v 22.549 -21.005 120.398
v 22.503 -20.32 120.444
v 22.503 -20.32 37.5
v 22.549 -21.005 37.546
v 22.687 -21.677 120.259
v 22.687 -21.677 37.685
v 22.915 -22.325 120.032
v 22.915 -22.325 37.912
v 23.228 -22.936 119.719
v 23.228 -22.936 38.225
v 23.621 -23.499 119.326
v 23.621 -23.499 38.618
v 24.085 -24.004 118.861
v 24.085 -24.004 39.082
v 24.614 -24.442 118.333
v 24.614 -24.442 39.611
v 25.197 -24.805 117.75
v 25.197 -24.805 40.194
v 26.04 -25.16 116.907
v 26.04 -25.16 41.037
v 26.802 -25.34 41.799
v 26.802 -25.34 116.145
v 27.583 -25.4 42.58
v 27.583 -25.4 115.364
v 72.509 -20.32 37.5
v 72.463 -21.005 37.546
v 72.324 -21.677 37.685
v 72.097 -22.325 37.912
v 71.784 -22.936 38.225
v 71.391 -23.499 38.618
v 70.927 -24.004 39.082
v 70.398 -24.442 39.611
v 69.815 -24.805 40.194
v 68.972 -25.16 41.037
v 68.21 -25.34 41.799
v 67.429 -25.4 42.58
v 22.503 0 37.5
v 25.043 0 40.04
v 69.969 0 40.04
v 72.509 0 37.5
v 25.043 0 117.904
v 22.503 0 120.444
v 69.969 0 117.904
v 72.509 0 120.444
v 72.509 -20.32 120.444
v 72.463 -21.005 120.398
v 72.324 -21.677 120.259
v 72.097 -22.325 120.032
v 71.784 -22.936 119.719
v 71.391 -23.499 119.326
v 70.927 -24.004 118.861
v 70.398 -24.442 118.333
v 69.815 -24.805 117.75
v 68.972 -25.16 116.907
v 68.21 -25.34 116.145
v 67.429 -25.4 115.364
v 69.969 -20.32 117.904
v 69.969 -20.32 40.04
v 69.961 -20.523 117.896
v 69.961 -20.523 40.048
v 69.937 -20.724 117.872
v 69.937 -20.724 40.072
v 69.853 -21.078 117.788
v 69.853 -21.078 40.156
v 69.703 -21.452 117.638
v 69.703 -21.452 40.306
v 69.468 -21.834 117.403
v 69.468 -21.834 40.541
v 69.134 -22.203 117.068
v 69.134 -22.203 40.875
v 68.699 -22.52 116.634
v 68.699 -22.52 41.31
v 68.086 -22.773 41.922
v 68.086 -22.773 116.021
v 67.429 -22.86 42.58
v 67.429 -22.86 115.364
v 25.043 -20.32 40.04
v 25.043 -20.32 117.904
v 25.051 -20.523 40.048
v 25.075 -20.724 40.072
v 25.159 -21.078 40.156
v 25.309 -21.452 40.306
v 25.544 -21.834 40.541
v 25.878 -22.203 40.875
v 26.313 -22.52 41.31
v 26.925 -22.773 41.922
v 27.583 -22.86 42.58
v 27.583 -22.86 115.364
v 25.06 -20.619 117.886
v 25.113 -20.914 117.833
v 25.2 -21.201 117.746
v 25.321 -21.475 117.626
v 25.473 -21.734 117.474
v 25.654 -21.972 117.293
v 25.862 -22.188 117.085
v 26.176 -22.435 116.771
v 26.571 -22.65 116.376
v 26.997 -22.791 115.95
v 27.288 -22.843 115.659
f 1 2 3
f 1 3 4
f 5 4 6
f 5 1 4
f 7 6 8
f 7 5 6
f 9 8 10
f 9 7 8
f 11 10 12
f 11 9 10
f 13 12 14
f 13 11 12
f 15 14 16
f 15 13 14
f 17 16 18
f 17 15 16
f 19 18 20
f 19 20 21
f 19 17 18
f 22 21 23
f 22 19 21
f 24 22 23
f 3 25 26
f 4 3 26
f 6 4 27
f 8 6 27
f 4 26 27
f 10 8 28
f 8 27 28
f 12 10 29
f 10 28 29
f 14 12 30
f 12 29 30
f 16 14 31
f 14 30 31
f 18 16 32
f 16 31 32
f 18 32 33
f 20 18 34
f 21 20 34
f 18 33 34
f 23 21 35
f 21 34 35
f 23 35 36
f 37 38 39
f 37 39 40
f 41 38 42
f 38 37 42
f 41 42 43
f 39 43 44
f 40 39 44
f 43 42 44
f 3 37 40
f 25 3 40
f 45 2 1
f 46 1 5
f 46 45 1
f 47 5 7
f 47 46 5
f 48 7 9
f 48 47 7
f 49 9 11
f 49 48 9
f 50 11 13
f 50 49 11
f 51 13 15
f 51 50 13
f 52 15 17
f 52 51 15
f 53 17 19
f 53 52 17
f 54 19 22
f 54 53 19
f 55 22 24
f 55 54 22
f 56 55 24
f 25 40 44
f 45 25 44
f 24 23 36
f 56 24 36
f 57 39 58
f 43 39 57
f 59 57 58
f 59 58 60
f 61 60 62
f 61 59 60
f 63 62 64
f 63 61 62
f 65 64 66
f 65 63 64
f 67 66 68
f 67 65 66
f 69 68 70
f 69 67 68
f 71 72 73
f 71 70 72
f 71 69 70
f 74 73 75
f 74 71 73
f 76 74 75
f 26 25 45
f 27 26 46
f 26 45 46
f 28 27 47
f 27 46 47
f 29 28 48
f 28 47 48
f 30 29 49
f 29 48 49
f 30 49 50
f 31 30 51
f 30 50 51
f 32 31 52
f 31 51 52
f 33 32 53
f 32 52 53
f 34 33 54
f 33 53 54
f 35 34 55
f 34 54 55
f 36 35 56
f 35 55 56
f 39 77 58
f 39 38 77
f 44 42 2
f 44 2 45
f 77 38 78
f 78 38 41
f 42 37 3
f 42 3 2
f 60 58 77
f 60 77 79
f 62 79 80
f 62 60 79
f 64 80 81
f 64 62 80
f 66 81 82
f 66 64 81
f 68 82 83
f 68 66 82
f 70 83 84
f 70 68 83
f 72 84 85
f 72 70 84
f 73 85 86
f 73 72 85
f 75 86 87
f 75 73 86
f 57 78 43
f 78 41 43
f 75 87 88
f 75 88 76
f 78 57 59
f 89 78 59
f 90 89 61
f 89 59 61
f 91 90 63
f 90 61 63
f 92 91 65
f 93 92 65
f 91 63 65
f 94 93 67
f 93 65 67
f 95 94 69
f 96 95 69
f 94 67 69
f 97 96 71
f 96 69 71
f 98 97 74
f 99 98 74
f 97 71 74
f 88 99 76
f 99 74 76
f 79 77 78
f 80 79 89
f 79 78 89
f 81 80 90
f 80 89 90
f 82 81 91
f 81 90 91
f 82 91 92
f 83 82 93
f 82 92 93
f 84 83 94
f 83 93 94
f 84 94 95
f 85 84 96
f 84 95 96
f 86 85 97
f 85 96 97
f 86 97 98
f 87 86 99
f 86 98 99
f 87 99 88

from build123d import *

# Parameters (mm, degrees)
F0_W     = 50.0062517822
F0_H     = 82.9441100359
F1_DEPTH = 25.4
F2_R     = 5.08
F3_T     = -2.54


# Not quite as in the source:
# - the program builds the solid bodies; features that only make, move or delete a surface that nothing else refers to are left out


with BuildPart() as f1:
    # F0 (on Front) → F1 (new body)
    with BuildSketch(Plane.XZ):
        with Locations((47.5059393793, 78.971914947)):
            Rectangle(F0_W, F0_H)
    extrude(amount=F1_DEPTH)

    # F2
    f2_edges = [f1.edges().sort_by_distance(p)[0] for p in [
        (72.509065, -25.4, 78.971915),
        (22.502813, -25.4, 78.971915),
        (47.505939, -25.4, 120.44397),
        (47.505939, -25.4, 37.49986),
    ]]
    fillet(f2_edges, radius=F2_R)

    # F3
    f3_openings = [f1.faces().sort_by_distance(p)[0] for p in [
        (47.505939, 0, 78.971915),
    ]]
    offset(amount=F3_T, openings=f3_openings)


solid = f1.part
